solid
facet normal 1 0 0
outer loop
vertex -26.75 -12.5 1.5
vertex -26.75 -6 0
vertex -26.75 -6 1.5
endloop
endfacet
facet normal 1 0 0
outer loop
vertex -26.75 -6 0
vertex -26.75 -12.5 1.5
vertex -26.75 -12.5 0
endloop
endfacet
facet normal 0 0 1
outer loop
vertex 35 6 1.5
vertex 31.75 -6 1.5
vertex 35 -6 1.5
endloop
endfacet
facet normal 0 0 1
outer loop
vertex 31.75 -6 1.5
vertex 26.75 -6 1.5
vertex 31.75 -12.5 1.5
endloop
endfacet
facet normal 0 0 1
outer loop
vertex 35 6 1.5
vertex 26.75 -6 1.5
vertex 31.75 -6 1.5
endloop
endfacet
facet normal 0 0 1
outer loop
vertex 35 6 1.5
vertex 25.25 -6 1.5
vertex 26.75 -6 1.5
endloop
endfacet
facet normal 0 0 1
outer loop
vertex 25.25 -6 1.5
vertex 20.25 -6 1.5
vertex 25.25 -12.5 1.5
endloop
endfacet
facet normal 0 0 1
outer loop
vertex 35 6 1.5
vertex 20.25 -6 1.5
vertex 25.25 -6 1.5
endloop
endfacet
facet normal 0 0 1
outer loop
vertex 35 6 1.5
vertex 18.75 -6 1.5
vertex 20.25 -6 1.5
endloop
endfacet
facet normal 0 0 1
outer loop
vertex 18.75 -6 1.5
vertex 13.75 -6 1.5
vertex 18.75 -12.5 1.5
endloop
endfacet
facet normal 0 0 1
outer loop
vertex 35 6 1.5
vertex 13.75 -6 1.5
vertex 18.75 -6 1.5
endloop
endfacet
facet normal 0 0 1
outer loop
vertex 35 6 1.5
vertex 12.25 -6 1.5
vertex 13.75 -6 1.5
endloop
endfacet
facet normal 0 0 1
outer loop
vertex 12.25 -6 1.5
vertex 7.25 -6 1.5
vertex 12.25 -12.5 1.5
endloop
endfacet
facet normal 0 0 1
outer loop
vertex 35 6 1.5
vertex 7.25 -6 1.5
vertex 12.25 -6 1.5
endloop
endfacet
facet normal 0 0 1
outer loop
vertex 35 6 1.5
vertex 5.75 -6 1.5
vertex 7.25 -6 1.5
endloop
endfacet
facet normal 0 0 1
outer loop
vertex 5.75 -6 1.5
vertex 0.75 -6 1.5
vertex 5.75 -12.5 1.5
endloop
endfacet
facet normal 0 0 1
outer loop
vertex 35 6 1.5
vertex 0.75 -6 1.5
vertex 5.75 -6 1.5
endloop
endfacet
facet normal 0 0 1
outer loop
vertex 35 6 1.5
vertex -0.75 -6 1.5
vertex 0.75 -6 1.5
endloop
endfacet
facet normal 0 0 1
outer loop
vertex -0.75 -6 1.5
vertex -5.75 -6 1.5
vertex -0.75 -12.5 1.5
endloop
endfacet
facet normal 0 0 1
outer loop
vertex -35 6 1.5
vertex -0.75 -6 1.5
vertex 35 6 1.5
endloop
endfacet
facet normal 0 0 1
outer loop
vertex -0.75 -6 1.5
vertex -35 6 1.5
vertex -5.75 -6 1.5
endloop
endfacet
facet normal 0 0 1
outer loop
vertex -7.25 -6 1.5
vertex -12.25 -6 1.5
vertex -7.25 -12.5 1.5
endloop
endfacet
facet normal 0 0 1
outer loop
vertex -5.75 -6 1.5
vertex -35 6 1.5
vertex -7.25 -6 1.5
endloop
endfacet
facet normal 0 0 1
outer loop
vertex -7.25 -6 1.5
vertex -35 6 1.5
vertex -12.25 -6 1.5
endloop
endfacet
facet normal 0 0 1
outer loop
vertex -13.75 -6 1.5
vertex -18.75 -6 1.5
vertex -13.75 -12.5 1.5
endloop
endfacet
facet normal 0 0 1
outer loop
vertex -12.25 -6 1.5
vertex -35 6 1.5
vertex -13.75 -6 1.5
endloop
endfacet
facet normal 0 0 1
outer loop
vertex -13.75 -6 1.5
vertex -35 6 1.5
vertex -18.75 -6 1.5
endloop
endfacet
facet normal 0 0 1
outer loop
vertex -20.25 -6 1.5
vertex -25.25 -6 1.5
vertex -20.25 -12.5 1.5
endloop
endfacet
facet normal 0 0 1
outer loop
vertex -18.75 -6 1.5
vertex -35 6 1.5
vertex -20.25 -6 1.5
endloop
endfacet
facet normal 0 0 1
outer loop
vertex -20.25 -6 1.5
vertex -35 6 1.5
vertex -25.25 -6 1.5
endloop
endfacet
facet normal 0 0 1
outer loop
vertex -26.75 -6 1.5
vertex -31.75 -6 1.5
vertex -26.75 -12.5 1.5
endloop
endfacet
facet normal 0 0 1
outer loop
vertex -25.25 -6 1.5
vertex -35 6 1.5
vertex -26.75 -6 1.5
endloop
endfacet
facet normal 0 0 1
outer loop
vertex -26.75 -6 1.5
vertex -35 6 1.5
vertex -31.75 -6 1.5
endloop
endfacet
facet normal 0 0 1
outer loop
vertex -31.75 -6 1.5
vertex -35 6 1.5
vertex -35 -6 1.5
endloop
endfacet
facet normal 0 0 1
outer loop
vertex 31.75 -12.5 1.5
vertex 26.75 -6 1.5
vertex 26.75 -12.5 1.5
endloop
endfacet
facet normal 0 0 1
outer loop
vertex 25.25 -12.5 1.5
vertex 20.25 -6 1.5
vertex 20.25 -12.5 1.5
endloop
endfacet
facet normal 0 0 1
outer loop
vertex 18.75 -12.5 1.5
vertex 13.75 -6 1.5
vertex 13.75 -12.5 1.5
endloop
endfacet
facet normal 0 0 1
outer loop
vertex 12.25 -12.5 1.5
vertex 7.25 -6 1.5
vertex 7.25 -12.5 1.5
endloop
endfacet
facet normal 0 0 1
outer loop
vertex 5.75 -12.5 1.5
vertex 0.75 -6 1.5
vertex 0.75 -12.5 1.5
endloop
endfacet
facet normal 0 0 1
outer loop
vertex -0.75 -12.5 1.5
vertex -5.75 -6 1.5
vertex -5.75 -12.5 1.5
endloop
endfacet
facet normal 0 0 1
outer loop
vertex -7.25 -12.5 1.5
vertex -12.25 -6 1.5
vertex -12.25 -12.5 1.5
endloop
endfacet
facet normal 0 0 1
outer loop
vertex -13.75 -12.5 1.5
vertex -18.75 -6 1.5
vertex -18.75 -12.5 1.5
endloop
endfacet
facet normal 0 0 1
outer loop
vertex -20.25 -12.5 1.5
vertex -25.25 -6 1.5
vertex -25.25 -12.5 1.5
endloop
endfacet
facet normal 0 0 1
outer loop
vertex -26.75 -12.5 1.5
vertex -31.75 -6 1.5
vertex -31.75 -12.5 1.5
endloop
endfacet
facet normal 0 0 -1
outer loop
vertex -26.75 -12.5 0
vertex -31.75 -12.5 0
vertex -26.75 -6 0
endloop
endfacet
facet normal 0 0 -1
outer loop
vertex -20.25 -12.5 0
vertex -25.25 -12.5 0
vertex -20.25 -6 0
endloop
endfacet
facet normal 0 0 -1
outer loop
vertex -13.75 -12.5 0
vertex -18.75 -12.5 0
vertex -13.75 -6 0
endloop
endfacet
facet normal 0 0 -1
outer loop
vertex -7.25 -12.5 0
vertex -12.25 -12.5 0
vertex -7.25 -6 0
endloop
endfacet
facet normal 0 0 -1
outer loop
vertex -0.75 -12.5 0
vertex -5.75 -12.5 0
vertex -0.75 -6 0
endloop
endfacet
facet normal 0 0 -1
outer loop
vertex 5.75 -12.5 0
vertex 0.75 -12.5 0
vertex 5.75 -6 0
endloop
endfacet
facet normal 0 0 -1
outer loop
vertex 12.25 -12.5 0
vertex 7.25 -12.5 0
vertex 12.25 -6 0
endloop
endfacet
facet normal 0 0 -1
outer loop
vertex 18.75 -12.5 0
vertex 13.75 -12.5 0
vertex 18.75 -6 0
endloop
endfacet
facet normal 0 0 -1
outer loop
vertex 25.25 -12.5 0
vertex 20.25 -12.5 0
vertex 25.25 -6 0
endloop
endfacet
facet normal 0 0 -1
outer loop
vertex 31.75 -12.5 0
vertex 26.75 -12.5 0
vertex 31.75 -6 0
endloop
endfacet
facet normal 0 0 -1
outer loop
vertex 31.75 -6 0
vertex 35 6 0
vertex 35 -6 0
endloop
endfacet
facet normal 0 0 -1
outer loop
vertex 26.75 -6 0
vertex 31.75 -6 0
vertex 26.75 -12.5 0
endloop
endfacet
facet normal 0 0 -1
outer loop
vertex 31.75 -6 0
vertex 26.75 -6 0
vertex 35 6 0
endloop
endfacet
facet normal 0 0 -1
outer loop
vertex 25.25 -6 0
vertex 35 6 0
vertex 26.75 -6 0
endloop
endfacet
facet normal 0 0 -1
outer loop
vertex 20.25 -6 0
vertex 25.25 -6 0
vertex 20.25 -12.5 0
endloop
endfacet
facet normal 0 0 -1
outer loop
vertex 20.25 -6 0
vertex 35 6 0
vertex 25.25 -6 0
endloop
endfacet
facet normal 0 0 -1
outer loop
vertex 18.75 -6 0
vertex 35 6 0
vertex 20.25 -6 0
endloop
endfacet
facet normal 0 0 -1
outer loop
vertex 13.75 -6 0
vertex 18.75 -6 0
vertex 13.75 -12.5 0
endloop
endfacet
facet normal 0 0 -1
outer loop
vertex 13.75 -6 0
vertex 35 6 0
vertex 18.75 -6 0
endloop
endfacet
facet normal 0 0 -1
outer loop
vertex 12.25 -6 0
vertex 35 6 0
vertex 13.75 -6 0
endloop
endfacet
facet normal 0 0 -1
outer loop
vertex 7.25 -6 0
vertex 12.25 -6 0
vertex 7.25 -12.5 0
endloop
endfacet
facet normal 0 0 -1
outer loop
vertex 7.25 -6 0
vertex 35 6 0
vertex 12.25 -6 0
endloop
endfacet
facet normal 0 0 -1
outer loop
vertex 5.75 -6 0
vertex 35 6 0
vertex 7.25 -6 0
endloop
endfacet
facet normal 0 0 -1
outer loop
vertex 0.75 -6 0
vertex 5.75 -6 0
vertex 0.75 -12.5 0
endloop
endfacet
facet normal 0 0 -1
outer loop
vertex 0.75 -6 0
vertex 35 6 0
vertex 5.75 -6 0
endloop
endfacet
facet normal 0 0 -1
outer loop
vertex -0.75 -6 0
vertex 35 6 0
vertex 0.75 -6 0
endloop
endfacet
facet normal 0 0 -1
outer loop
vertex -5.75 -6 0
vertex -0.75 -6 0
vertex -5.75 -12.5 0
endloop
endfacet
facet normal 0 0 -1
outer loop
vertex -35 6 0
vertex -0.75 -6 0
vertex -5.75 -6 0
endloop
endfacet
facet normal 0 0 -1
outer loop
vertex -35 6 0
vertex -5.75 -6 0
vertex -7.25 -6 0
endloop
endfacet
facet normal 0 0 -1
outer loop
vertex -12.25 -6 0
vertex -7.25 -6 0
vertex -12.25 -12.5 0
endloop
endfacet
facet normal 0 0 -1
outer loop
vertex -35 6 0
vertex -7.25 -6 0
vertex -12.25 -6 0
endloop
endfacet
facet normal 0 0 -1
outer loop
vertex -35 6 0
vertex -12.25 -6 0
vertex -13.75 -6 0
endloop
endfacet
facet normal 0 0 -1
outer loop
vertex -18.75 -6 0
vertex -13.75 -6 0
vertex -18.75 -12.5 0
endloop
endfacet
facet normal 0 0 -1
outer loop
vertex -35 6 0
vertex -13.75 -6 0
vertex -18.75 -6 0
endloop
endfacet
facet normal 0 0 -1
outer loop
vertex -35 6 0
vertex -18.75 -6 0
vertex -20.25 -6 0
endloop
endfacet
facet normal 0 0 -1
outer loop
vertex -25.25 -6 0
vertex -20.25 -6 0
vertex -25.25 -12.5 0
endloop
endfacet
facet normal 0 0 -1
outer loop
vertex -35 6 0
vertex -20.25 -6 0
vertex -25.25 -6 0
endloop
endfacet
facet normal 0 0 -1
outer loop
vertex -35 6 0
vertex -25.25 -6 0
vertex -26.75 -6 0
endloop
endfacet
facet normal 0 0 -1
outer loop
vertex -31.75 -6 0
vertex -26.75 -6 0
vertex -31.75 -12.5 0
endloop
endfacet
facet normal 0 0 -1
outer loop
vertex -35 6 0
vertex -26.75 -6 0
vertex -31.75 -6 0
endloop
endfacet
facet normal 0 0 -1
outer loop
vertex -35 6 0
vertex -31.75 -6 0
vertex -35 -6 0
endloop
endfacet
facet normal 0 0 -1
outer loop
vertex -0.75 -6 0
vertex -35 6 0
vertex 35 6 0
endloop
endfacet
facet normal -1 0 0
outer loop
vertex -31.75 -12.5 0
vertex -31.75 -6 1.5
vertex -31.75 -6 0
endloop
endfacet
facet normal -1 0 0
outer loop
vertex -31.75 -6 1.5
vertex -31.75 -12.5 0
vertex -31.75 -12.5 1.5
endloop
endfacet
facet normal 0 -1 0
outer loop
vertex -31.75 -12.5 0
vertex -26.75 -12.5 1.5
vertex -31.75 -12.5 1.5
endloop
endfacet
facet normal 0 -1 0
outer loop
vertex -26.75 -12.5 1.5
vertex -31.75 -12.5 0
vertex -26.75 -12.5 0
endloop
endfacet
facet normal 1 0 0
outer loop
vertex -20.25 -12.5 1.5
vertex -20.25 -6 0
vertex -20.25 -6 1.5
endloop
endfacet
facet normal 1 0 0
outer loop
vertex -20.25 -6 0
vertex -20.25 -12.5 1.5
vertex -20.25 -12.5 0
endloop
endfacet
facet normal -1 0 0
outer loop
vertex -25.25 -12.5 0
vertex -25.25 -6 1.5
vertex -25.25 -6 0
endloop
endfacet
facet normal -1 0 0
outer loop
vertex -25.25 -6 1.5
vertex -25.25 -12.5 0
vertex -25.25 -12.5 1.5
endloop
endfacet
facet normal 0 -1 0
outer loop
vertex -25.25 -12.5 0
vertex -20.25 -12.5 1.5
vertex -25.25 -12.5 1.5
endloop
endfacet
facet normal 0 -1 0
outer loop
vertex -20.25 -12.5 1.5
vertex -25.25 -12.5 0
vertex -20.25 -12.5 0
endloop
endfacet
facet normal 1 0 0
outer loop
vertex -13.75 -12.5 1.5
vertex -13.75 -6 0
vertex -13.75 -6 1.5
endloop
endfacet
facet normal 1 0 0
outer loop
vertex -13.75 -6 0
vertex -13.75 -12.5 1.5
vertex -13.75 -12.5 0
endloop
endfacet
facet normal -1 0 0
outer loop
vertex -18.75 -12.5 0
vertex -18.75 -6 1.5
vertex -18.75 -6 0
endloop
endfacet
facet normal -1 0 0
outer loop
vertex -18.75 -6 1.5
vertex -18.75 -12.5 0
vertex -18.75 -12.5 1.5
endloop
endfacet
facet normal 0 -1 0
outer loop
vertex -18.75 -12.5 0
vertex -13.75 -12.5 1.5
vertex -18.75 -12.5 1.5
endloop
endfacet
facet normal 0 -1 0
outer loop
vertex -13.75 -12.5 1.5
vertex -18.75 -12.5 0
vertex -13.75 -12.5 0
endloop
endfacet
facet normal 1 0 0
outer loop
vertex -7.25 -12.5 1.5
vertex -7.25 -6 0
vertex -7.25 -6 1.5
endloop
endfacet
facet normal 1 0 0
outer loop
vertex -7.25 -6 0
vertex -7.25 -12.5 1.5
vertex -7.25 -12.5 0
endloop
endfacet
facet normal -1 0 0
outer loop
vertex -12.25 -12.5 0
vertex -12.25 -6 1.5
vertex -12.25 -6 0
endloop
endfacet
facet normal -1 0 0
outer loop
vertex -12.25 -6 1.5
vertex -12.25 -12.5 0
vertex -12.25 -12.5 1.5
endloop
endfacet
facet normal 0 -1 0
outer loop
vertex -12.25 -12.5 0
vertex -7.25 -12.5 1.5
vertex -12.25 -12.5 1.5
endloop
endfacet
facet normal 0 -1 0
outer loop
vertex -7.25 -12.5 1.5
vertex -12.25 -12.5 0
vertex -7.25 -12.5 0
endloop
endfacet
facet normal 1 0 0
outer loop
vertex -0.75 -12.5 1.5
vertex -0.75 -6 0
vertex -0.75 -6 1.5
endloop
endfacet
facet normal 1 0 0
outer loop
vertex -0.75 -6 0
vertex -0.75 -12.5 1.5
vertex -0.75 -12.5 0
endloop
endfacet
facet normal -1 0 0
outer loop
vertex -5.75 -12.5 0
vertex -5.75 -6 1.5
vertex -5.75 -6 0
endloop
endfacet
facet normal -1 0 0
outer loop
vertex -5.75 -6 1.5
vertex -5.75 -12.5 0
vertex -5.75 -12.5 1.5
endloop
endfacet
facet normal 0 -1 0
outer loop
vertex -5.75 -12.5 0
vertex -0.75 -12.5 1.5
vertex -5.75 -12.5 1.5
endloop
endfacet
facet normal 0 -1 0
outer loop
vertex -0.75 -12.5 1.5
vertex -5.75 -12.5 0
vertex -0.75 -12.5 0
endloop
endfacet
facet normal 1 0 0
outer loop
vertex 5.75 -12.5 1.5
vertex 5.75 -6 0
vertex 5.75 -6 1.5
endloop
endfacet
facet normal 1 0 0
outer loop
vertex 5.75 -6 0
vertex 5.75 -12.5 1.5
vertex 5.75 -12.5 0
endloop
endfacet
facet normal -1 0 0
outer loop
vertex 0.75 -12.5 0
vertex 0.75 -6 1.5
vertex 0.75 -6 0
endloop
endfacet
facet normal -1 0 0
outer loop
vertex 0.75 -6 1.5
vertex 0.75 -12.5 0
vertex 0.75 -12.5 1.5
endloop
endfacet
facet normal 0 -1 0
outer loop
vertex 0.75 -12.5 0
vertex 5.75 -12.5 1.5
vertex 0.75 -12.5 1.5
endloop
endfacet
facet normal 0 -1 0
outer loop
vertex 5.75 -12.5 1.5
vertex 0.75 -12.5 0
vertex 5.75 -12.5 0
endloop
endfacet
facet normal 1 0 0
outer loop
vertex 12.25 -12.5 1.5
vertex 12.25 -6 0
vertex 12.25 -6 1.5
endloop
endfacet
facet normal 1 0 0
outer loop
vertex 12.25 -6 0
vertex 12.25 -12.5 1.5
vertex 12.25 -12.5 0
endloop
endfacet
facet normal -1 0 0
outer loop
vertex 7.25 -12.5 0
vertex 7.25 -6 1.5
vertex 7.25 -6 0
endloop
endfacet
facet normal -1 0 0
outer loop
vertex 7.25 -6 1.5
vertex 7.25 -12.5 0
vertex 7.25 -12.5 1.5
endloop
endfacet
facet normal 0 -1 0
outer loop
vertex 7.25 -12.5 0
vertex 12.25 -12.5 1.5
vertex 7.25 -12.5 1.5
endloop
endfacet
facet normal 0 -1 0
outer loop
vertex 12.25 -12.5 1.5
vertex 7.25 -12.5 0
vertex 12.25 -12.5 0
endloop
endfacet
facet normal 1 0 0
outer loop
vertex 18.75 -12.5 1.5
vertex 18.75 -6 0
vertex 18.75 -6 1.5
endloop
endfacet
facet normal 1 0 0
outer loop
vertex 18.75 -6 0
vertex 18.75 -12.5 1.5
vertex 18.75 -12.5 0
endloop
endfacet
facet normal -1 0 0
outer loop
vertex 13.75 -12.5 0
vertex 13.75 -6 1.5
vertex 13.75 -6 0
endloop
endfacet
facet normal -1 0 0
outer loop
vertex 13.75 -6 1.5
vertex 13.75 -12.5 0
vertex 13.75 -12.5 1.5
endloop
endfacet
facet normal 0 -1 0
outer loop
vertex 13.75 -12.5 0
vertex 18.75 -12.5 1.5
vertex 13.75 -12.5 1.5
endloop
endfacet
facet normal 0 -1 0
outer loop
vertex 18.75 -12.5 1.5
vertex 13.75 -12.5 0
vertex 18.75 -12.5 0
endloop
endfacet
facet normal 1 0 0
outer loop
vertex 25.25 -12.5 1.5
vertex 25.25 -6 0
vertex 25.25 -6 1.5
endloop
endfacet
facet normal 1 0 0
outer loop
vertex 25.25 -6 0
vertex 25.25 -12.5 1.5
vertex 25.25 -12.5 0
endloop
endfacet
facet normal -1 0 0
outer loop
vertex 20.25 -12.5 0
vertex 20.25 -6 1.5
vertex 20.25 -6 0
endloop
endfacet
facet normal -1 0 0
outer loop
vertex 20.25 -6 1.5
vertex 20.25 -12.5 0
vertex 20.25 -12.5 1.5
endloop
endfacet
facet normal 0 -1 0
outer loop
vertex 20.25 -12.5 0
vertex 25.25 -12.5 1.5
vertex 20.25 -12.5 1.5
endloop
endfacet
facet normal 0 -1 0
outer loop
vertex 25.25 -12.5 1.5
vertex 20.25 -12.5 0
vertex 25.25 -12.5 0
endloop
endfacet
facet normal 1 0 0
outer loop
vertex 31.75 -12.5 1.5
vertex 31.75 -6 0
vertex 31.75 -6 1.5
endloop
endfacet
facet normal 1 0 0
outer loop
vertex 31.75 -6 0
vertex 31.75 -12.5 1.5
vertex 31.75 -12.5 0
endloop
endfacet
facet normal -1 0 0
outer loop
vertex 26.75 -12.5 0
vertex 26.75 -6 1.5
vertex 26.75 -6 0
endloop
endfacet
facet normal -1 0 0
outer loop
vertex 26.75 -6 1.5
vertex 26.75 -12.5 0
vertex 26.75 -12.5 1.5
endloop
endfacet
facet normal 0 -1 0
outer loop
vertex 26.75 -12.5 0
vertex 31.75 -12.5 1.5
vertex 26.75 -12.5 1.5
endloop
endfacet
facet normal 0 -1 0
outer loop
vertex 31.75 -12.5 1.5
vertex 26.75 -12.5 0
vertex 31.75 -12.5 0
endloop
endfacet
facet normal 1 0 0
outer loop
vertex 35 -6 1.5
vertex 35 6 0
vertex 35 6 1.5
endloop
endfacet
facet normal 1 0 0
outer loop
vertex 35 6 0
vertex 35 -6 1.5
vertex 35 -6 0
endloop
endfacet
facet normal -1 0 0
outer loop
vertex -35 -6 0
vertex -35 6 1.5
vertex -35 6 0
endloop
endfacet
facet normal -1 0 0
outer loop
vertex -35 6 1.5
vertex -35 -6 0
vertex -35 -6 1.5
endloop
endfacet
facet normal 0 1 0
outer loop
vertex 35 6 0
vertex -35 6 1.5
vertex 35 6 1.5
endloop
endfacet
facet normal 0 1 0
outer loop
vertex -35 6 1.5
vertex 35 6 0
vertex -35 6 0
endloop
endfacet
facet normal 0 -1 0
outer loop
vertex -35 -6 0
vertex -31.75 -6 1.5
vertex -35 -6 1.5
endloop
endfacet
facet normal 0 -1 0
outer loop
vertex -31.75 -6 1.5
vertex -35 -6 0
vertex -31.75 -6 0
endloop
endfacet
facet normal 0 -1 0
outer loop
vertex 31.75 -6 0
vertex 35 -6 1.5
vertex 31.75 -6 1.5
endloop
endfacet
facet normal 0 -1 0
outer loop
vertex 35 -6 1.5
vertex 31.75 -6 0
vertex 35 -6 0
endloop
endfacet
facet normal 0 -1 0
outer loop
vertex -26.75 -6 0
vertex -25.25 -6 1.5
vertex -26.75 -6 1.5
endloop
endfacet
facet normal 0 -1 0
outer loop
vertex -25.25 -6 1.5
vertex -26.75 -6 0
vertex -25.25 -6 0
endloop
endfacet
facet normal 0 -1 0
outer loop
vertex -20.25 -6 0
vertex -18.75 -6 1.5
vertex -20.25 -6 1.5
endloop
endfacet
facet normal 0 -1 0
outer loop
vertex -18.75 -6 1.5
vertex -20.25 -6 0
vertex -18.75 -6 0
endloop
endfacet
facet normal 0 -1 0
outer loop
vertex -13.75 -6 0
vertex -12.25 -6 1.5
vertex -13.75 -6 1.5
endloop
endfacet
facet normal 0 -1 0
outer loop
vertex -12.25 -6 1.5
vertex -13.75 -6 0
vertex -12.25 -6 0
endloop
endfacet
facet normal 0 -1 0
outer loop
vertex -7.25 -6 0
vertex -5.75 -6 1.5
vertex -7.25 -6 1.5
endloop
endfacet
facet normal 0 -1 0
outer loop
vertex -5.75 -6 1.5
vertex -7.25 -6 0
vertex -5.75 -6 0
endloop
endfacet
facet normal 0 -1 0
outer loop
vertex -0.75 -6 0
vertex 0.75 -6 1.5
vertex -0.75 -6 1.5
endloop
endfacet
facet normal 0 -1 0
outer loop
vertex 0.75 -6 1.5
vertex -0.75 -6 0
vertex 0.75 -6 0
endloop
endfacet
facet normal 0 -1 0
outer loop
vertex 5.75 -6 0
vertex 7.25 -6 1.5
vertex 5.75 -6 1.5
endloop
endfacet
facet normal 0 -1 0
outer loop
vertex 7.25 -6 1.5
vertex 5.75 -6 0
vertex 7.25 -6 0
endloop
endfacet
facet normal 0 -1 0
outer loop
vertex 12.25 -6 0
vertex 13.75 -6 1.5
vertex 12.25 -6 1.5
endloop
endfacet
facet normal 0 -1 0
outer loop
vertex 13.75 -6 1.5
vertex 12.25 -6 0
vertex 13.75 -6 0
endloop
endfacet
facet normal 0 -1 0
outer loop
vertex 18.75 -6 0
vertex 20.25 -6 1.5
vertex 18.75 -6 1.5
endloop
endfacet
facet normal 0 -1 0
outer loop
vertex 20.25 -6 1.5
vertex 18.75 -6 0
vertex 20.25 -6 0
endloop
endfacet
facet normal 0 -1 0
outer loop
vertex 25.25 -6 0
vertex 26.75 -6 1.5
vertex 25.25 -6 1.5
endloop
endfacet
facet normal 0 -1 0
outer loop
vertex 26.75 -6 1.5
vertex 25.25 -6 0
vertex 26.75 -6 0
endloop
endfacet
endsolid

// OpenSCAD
// 10-well comb for agarose gel casting
// Printed lying flat, teeth pointing down (-Y), spine along X

// ---------- Parameters ----------
tooth_count  = 10;    // number of wells
tooth_width  = 5.0;   // tooth width along X (mm)
tooth_length = 12;    // tooth length along Y (mm)
teeth_gap    = 1.5;   // gap between neighbouring teeth along X (mm)
spine_width  = 12;    // spine width along Y (mm)
spine_length = 70;    // spine length along X (mm)
plate_thk    = 1.5;   // plate thickness along Z (mm)

eps          = 0.5;   // cutter overshoot past faces (mm)

// ---------- Derived ----------
pitch      = tooth_width + teeth_gap;            // centre-to-centre spacing of teeth
teeth_span = (tooth_count - 1) * pitch;          // distance between first and last tooth centres
x0         = -teeth_span / 2;                    // first tooth centre (row centred on origin)

// ---------- Model ----------
union() {
    // Teeth: extend past -Y edge of spine so the cut is clean
    for (i = [0 : tooth_count - 1])
        translate([x0 + i * pitch - tooth_width / 2,
                   -tooth_length - eps,
                   0])
            cube([tooth_width, tooth_length + eps, plate_thk]);

    // Spine (back bar)
    translate([-spine_length / 2, -spine_width / 2, 0])
        cube([spine_length, spine_width, plate_thk]);
}
